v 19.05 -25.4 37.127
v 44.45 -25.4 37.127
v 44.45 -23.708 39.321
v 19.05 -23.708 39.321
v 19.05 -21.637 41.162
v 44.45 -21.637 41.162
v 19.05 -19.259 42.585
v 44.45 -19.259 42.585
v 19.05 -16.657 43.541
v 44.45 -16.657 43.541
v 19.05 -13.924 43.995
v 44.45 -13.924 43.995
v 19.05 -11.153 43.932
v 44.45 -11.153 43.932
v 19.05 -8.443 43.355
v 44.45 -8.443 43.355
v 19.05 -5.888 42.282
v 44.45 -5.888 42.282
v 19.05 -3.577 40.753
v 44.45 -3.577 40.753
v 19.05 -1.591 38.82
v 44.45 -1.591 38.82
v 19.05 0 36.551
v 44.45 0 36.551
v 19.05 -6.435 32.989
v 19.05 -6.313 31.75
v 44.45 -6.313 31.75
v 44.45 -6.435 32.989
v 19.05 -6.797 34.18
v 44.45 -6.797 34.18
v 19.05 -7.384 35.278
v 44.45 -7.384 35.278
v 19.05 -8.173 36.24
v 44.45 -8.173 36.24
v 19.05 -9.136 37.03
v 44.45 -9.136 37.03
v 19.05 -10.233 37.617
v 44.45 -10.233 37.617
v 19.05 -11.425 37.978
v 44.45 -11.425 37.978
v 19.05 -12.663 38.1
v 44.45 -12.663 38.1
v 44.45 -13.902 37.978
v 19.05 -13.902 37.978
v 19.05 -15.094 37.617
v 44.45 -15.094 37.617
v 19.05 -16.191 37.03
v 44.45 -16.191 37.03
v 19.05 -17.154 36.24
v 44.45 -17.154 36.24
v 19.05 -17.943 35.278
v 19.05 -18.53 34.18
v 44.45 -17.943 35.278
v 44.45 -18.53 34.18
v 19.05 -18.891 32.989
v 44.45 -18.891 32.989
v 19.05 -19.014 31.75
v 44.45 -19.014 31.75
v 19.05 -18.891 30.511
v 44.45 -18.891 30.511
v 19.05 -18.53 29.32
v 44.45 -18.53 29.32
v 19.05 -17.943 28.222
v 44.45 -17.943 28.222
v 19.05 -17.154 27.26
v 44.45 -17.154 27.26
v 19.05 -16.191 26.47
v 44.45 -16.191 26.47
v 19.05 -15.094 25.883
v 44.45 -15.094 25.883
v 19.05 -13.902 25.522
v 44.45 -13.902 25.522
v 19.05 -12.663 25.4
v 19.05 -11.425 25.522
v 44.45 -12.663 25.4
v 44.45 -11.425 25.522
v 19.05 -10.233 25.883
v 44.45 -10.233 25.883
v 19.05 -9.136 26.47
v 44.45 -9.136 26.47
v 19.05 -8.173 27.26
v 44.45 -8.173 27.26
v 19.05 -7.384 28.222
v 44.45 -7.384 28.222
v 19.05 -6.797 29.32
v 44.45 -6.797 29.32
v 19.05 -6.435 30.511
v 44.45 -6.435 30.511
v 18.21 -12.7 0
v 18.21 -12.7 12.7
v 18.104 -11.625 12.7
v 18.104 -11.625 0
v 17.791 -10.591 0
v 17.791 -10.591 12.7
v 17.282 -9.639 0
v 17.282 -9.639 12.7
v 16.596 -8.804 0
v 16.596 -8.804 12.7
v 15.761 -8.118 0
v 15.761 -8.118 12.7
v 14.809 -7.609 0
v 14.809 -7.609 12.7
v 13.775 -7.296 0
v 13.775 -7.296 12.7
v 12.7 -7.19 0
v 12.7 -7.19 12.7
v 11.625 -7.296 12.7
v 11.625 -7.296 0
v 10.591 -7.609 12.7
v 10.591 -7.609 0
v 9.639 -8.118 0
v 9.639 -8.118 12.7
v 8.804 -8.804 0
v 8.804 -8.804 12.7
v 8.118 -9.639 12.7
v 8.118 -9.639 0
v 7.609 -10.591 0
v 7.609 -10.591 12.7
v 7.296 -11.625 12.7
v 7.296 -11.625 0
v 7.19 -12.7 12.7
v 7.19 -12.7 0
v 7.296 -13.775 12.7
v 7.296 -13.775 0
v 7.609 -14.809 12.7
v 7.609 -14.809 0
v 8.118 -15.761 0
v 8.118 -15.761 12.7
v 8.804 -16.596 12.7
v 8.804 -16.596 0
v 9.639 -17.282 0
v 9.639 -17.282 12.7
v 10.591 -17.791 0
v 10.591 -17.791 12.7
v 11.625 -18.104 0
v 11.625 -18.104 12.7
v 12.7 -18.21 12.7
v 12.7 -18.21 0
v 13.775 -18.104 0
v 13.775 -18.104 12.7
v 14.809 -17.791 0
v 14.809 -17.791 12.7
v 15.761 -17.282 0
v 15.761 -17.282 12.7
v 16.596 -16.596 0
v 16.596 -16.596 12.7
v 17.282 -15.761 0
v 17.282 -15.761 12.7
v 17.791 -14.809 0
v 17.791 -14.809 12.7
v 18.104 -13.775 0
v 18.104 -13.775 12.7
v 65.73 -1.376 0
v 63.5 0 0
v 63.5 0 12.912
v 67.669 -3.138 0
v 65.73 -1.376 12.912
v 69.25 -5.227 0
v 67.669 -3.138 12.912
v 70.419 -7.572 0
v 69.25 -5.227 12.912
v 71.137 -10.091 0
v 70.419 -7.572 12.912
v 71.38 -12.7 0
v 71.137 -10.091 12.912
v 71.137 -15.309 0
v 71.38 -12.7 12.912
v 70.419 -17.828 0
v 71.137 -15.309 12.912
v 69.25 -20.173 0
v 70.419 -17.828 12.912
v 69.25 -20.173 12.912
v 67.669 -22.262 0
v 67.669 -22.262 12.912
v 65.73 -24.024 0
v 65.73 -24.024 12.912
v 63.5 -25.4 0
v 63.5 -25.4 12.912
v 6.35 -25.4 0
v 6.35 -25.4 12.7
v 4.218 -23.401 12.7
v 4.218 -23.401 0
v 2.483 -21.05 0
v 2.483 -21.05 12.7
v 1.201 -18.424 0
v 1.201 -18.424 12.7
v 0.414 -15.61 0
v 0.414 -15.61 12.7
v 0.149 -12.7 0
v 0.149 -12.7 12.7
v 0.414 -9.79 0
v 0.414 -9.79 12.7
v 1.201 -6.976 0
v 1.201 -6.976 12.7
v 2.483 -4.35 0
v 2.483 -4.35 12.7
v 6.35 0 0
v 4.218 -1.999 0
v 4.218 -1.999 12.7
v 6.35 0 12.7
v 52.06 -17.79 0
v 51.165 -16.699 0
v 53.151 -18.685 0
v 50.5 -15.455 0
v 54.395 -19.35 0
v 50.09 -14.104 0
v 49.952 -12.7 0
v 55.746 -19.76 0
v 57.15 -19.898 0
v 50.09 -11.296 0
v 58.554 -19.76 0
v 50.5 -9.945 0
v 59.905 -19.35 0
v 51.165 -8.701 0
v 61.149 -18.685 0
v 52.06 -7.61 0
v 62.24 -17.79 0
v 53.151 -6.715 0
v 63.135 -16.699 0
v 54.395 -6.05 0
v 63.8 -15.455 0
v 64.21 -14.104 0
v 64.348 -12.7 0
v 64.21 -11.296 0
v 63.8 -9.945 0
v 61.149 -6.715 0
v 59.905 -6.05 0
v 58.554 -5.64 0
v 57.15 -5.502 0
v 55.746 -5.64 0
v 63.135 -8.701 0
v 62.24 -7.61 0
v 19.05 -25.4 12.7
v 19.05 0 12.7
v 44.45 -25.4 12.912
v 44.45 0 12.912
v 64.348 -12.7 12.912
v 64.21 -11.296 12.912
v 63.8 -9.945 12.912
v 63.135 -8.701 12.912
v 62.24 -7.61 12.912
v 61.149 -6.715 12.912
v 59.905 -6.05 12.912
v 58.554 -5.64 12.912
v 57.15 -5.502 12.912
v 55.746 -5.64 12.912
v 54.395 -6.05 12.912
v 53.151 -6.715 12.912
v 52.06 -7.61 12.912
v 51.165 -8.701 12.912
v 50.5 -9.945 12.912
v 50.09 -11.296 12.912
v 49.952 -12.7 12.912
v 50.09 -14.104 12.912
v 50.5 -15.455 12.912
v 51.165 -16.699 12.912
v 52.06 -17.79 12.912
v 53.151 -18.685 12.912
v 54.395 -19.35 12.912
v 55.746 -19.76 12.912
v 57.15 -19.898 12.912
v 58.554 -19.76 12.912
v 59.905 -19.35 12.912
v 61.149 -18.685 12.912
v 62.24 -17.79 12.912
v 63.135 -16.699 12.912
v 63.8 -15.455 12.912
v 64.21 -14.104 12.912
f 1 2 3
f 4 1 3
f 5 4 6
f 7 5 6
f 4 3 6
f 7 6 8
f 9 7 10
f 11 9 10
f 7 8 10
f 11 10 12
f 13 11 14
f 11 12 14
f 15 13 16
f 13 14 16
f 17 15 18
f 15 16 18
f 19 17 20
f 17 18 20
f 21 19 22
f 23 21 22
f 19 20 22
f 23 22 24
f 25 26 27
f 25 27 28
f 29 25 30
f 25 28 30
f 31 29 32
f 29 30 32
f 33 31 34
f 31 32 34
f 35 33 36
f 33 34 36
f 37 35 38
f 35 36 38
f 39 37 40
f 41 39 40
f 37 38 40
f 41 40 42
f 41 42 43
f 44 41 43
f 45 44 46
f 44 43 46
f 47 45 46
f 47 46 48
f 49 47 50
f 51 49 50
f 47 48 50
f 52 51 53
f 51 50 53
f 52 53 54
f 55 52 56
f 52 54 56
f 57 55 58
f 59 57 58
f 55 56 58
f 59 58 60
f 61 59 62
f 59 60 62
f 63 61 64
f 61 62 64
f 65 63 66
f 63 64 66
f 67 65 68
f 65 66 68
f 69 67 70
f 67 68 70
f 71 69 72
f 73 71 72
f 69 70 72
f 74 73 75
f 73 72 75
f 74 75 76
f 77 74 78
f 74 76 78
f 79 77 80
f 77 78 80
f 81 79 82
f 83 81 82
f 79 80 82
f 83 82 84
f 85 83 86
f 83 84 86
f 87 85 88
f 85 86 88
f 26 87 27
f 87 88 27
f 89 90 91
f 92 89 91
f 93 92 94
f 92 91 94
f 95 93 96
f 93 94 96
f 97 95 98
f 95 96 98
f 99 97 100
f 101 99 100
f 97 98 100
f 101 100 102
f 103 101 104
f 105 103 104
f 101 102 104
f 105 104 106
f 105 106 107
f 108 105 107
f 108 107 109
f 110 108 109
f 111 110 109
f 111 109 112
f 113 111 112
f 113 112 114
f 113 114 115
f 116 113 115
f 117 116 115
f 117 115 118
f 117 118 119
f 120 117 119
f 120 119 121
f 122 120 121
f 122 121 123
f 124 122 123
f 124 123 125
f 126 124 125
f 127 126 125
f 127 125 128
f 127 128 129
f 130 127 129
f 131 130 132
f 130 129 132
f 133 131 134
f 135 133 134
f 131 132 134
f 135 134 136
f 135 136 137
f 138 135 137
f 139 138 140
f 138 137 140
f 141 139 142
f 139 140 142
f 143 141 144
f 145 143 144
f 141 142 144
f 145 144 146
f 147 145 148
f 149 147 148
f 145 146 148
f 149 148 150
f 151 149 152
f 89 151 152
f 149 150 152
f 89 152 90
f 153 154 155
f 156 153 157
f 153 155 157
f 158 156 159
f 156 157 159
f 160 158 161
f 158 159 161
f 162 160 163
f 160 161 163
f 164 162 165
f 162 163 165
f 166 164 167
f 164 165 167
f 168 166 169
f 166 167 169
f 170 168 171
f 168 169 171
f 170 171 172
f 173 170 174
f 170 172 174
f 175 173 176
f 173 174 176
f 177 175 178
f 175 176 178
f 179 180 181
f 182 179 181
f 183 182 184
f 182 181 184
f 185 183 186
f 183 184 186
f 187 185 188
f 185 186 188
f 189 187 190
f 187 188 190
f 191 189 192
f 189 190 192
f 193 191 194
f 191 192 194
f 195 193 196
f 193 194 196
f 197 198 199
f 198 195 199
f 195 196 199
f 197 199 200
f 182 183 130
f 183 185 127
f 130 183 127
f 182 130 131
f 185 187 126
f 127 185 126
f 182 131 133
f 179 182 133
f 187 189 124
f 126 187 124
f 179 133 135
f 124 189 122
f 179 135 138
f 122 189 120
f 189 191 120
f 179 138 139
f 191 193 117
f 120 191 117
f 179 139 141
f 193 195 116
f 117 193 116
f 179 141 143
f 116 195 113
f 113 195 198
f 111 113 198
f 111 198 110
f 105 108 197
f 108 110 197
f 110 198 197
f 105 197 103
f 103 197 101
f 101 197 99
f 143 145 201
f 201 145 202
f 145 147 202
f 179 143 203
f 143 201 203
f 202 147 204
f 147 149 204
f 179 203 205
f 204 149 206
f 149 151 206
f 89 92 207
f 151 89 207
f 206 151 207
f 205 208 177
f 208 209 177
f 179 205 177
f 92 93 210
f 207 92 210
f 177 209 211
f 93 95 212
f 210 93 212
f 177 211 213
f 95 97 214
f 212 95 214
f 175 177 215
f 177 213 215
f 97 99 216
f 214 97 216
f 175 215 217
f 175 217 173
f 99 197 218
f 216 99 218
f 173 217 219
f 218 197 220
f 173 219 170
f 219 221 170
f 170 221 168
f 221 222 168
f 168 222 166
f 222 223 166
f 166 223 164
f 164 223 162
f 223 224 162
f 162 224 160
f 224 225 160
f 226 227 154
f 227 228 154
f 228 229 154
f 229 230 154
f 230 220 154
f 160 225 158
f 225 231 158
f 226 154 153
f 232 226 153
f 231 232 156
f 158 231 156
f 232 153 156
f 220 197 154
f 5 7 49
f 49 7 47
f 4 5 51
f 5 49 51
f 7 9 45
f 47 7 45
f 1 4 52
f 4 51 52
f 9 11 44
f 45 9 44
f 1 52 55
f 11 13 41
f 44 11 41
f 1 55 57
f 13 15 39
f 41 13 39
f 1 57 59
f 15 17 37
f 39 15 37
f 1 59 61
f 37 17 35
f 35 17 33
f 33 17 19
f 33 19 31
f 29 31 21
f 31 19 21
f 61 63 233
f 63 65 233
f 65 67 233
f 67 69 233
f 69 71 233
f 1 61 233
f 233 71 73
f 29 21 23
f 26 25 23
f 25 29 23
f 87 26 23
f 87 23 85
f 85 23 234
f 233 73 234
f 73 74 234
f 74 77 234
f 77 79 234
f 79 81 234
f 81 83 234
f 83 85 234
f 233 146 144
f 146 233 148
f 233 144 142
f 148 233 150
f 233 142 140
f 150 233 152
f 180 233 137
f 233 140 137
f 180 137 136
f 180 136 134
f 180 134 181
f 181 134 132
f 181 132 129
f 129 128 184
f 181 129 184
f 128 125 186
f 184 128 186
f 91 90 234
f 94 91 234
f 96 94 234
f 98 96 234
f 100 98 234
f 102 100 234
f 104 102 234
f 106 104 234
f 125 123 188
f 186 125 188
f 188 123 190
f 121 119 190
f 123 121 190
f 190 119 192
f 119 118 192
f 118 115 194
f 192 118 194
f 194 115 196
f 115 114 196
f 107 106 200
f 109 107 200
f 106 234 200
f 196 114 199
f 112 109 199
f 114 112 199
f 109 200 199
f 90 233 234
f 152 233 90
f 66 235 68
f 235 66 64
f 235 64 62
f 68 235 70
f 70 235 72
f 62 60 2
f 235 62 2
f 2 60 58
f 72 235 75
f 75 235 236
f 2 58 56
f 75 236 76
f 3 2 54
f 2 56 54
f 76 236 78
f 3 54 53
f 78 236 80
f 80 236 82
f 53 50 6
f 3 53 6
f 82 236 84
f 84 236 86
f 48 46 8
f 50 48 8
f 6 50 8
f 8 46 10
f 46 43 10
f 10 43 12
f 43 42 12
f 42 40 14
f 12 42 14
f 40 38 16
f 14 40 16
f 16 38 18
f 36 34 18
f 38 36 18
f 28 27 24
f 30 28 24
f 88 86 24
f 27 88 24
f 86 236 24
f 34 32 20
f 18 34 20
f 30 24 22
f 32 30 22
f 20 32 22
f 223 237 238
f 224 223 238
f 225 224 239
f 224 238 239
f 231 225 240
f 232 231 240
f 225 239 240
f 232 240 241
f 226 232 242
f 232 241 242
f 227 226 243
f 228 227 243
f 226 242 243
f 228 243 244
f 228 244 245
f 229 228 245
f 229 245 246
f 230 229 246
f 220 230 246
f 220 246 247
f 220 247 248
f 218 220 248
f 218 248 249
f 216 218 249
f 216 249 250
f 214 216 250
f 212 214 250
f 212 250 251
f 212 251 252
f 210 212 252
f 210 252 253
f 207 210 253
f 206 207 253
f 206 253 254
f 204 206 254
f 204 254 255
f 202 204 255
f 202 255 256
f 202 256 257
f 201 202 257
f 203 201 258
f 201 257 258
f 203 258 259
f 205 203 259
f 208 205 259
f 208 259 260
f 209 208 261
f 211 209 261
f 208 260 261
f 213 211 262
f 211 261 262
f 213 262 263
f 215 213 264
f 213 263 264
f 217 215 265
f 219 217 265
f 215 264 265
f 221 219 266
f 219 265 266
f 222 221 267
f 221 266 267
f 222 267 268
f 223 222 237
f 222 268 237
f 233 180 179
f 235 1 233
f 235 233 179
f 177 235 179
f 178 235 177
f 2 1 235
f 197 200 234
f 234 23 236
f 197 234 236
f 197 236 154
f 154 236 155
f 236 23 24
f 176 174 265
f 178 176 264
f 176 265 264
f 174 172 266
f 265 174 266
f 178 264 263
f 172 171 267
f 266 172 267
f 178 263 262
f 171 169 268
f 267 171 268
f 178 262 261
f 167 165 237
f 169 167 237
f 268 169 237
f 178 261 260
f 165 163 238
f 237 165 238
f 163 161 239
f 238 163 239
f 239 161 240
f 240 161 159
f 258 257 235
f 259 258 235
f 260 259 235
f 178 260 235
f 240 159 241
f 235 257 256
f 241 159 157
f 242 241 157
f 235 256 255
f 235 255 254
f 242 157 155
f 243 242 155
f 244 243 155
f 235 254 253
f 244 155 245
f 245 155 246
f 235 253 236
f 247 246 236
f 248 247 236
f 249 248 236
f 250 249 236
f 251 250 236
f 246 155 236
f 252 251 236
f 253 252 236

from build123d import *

# Parameters (mm, degrees)
F1_DEPTH = 25.4
F2_R     = 6.350053
F3_DEPTH = 25.4
F4_R     = 7.19822
F5_DEPTH = 25.4
F6_R     = 5.510191
F7_DEPTH = 25.4


with BuildPart() as f1:
    # F0 (on Front) → F1 (new body)
    with BuildSketch(Plane.XZ):
        Polygon((0, 12.7), (0, 0), (76.2, 0), (76.2, 12.911667), (44.45, 12.911667), (44.45, 44.45), (19.05, 44.45), (19.05, 12.7), align=None)
    extrude(amount=F1_DEPTH)

    # F2 (on face) → F3 (cut)
    with BuildSketch(Plane.YZ.offset(44.45)):
        with BuildLine():
            ThreePointArc((-25.4, 37.126943), (-12.537074, 44.028554), (0, 36.55133))
            Line((0, 36.55133), (0, 44.45))
            Line((0, 44.45), (-25.4, 44.45))
            Line((-25.4, 44.45), (-25.4, 37.126943))
        make_face()
        with Locations((-12.663453, 31.75)):
            Circle(F2_R)
    extrude(amount=-F3_DEPTH, mode=Mode.SUBTRACT)

    # F4 (on face) → F5 (cut)
    with BuildSketch(Plane.XY.offset(12.911667)):
        with Locations((57.15, -12.7)):
            Circle(F4_R)
        with BuildLine():
            ThreePointArc((63.5, 0), (71.379619, -12.7), (63.5, -25.4))
            Line((63.5, -25.4), (76.2, -25.4))
            Line((76.2, -25.4), (76.2, 0))
            Line((76.2, 0), (63.5, 0))
        make_face()
    extrude(amount=-F5_DEPTH, mode=Mode.SUBTRACT)

    # F6 (on face) → F7 (cut)
    with BuildSketch(Plane.XY.offset(12.7)):
        with BuildLine():
            ThreePointArc((6.35, -25.4), (0.149355, -12.7), (6.35, 0))
            Line((6.35, 0), (0, 0))
            Line((0, 0), (0, -25.4))
            Line((0, -25.4), (6.35, -25.4))
        make_face()
        with Locations((12.7, -12.7)):
            Circle(F6_R)
    extrude(amount=-F7_DEPTH, mode=Mode.SUBTRACT)


solid = f1.part
